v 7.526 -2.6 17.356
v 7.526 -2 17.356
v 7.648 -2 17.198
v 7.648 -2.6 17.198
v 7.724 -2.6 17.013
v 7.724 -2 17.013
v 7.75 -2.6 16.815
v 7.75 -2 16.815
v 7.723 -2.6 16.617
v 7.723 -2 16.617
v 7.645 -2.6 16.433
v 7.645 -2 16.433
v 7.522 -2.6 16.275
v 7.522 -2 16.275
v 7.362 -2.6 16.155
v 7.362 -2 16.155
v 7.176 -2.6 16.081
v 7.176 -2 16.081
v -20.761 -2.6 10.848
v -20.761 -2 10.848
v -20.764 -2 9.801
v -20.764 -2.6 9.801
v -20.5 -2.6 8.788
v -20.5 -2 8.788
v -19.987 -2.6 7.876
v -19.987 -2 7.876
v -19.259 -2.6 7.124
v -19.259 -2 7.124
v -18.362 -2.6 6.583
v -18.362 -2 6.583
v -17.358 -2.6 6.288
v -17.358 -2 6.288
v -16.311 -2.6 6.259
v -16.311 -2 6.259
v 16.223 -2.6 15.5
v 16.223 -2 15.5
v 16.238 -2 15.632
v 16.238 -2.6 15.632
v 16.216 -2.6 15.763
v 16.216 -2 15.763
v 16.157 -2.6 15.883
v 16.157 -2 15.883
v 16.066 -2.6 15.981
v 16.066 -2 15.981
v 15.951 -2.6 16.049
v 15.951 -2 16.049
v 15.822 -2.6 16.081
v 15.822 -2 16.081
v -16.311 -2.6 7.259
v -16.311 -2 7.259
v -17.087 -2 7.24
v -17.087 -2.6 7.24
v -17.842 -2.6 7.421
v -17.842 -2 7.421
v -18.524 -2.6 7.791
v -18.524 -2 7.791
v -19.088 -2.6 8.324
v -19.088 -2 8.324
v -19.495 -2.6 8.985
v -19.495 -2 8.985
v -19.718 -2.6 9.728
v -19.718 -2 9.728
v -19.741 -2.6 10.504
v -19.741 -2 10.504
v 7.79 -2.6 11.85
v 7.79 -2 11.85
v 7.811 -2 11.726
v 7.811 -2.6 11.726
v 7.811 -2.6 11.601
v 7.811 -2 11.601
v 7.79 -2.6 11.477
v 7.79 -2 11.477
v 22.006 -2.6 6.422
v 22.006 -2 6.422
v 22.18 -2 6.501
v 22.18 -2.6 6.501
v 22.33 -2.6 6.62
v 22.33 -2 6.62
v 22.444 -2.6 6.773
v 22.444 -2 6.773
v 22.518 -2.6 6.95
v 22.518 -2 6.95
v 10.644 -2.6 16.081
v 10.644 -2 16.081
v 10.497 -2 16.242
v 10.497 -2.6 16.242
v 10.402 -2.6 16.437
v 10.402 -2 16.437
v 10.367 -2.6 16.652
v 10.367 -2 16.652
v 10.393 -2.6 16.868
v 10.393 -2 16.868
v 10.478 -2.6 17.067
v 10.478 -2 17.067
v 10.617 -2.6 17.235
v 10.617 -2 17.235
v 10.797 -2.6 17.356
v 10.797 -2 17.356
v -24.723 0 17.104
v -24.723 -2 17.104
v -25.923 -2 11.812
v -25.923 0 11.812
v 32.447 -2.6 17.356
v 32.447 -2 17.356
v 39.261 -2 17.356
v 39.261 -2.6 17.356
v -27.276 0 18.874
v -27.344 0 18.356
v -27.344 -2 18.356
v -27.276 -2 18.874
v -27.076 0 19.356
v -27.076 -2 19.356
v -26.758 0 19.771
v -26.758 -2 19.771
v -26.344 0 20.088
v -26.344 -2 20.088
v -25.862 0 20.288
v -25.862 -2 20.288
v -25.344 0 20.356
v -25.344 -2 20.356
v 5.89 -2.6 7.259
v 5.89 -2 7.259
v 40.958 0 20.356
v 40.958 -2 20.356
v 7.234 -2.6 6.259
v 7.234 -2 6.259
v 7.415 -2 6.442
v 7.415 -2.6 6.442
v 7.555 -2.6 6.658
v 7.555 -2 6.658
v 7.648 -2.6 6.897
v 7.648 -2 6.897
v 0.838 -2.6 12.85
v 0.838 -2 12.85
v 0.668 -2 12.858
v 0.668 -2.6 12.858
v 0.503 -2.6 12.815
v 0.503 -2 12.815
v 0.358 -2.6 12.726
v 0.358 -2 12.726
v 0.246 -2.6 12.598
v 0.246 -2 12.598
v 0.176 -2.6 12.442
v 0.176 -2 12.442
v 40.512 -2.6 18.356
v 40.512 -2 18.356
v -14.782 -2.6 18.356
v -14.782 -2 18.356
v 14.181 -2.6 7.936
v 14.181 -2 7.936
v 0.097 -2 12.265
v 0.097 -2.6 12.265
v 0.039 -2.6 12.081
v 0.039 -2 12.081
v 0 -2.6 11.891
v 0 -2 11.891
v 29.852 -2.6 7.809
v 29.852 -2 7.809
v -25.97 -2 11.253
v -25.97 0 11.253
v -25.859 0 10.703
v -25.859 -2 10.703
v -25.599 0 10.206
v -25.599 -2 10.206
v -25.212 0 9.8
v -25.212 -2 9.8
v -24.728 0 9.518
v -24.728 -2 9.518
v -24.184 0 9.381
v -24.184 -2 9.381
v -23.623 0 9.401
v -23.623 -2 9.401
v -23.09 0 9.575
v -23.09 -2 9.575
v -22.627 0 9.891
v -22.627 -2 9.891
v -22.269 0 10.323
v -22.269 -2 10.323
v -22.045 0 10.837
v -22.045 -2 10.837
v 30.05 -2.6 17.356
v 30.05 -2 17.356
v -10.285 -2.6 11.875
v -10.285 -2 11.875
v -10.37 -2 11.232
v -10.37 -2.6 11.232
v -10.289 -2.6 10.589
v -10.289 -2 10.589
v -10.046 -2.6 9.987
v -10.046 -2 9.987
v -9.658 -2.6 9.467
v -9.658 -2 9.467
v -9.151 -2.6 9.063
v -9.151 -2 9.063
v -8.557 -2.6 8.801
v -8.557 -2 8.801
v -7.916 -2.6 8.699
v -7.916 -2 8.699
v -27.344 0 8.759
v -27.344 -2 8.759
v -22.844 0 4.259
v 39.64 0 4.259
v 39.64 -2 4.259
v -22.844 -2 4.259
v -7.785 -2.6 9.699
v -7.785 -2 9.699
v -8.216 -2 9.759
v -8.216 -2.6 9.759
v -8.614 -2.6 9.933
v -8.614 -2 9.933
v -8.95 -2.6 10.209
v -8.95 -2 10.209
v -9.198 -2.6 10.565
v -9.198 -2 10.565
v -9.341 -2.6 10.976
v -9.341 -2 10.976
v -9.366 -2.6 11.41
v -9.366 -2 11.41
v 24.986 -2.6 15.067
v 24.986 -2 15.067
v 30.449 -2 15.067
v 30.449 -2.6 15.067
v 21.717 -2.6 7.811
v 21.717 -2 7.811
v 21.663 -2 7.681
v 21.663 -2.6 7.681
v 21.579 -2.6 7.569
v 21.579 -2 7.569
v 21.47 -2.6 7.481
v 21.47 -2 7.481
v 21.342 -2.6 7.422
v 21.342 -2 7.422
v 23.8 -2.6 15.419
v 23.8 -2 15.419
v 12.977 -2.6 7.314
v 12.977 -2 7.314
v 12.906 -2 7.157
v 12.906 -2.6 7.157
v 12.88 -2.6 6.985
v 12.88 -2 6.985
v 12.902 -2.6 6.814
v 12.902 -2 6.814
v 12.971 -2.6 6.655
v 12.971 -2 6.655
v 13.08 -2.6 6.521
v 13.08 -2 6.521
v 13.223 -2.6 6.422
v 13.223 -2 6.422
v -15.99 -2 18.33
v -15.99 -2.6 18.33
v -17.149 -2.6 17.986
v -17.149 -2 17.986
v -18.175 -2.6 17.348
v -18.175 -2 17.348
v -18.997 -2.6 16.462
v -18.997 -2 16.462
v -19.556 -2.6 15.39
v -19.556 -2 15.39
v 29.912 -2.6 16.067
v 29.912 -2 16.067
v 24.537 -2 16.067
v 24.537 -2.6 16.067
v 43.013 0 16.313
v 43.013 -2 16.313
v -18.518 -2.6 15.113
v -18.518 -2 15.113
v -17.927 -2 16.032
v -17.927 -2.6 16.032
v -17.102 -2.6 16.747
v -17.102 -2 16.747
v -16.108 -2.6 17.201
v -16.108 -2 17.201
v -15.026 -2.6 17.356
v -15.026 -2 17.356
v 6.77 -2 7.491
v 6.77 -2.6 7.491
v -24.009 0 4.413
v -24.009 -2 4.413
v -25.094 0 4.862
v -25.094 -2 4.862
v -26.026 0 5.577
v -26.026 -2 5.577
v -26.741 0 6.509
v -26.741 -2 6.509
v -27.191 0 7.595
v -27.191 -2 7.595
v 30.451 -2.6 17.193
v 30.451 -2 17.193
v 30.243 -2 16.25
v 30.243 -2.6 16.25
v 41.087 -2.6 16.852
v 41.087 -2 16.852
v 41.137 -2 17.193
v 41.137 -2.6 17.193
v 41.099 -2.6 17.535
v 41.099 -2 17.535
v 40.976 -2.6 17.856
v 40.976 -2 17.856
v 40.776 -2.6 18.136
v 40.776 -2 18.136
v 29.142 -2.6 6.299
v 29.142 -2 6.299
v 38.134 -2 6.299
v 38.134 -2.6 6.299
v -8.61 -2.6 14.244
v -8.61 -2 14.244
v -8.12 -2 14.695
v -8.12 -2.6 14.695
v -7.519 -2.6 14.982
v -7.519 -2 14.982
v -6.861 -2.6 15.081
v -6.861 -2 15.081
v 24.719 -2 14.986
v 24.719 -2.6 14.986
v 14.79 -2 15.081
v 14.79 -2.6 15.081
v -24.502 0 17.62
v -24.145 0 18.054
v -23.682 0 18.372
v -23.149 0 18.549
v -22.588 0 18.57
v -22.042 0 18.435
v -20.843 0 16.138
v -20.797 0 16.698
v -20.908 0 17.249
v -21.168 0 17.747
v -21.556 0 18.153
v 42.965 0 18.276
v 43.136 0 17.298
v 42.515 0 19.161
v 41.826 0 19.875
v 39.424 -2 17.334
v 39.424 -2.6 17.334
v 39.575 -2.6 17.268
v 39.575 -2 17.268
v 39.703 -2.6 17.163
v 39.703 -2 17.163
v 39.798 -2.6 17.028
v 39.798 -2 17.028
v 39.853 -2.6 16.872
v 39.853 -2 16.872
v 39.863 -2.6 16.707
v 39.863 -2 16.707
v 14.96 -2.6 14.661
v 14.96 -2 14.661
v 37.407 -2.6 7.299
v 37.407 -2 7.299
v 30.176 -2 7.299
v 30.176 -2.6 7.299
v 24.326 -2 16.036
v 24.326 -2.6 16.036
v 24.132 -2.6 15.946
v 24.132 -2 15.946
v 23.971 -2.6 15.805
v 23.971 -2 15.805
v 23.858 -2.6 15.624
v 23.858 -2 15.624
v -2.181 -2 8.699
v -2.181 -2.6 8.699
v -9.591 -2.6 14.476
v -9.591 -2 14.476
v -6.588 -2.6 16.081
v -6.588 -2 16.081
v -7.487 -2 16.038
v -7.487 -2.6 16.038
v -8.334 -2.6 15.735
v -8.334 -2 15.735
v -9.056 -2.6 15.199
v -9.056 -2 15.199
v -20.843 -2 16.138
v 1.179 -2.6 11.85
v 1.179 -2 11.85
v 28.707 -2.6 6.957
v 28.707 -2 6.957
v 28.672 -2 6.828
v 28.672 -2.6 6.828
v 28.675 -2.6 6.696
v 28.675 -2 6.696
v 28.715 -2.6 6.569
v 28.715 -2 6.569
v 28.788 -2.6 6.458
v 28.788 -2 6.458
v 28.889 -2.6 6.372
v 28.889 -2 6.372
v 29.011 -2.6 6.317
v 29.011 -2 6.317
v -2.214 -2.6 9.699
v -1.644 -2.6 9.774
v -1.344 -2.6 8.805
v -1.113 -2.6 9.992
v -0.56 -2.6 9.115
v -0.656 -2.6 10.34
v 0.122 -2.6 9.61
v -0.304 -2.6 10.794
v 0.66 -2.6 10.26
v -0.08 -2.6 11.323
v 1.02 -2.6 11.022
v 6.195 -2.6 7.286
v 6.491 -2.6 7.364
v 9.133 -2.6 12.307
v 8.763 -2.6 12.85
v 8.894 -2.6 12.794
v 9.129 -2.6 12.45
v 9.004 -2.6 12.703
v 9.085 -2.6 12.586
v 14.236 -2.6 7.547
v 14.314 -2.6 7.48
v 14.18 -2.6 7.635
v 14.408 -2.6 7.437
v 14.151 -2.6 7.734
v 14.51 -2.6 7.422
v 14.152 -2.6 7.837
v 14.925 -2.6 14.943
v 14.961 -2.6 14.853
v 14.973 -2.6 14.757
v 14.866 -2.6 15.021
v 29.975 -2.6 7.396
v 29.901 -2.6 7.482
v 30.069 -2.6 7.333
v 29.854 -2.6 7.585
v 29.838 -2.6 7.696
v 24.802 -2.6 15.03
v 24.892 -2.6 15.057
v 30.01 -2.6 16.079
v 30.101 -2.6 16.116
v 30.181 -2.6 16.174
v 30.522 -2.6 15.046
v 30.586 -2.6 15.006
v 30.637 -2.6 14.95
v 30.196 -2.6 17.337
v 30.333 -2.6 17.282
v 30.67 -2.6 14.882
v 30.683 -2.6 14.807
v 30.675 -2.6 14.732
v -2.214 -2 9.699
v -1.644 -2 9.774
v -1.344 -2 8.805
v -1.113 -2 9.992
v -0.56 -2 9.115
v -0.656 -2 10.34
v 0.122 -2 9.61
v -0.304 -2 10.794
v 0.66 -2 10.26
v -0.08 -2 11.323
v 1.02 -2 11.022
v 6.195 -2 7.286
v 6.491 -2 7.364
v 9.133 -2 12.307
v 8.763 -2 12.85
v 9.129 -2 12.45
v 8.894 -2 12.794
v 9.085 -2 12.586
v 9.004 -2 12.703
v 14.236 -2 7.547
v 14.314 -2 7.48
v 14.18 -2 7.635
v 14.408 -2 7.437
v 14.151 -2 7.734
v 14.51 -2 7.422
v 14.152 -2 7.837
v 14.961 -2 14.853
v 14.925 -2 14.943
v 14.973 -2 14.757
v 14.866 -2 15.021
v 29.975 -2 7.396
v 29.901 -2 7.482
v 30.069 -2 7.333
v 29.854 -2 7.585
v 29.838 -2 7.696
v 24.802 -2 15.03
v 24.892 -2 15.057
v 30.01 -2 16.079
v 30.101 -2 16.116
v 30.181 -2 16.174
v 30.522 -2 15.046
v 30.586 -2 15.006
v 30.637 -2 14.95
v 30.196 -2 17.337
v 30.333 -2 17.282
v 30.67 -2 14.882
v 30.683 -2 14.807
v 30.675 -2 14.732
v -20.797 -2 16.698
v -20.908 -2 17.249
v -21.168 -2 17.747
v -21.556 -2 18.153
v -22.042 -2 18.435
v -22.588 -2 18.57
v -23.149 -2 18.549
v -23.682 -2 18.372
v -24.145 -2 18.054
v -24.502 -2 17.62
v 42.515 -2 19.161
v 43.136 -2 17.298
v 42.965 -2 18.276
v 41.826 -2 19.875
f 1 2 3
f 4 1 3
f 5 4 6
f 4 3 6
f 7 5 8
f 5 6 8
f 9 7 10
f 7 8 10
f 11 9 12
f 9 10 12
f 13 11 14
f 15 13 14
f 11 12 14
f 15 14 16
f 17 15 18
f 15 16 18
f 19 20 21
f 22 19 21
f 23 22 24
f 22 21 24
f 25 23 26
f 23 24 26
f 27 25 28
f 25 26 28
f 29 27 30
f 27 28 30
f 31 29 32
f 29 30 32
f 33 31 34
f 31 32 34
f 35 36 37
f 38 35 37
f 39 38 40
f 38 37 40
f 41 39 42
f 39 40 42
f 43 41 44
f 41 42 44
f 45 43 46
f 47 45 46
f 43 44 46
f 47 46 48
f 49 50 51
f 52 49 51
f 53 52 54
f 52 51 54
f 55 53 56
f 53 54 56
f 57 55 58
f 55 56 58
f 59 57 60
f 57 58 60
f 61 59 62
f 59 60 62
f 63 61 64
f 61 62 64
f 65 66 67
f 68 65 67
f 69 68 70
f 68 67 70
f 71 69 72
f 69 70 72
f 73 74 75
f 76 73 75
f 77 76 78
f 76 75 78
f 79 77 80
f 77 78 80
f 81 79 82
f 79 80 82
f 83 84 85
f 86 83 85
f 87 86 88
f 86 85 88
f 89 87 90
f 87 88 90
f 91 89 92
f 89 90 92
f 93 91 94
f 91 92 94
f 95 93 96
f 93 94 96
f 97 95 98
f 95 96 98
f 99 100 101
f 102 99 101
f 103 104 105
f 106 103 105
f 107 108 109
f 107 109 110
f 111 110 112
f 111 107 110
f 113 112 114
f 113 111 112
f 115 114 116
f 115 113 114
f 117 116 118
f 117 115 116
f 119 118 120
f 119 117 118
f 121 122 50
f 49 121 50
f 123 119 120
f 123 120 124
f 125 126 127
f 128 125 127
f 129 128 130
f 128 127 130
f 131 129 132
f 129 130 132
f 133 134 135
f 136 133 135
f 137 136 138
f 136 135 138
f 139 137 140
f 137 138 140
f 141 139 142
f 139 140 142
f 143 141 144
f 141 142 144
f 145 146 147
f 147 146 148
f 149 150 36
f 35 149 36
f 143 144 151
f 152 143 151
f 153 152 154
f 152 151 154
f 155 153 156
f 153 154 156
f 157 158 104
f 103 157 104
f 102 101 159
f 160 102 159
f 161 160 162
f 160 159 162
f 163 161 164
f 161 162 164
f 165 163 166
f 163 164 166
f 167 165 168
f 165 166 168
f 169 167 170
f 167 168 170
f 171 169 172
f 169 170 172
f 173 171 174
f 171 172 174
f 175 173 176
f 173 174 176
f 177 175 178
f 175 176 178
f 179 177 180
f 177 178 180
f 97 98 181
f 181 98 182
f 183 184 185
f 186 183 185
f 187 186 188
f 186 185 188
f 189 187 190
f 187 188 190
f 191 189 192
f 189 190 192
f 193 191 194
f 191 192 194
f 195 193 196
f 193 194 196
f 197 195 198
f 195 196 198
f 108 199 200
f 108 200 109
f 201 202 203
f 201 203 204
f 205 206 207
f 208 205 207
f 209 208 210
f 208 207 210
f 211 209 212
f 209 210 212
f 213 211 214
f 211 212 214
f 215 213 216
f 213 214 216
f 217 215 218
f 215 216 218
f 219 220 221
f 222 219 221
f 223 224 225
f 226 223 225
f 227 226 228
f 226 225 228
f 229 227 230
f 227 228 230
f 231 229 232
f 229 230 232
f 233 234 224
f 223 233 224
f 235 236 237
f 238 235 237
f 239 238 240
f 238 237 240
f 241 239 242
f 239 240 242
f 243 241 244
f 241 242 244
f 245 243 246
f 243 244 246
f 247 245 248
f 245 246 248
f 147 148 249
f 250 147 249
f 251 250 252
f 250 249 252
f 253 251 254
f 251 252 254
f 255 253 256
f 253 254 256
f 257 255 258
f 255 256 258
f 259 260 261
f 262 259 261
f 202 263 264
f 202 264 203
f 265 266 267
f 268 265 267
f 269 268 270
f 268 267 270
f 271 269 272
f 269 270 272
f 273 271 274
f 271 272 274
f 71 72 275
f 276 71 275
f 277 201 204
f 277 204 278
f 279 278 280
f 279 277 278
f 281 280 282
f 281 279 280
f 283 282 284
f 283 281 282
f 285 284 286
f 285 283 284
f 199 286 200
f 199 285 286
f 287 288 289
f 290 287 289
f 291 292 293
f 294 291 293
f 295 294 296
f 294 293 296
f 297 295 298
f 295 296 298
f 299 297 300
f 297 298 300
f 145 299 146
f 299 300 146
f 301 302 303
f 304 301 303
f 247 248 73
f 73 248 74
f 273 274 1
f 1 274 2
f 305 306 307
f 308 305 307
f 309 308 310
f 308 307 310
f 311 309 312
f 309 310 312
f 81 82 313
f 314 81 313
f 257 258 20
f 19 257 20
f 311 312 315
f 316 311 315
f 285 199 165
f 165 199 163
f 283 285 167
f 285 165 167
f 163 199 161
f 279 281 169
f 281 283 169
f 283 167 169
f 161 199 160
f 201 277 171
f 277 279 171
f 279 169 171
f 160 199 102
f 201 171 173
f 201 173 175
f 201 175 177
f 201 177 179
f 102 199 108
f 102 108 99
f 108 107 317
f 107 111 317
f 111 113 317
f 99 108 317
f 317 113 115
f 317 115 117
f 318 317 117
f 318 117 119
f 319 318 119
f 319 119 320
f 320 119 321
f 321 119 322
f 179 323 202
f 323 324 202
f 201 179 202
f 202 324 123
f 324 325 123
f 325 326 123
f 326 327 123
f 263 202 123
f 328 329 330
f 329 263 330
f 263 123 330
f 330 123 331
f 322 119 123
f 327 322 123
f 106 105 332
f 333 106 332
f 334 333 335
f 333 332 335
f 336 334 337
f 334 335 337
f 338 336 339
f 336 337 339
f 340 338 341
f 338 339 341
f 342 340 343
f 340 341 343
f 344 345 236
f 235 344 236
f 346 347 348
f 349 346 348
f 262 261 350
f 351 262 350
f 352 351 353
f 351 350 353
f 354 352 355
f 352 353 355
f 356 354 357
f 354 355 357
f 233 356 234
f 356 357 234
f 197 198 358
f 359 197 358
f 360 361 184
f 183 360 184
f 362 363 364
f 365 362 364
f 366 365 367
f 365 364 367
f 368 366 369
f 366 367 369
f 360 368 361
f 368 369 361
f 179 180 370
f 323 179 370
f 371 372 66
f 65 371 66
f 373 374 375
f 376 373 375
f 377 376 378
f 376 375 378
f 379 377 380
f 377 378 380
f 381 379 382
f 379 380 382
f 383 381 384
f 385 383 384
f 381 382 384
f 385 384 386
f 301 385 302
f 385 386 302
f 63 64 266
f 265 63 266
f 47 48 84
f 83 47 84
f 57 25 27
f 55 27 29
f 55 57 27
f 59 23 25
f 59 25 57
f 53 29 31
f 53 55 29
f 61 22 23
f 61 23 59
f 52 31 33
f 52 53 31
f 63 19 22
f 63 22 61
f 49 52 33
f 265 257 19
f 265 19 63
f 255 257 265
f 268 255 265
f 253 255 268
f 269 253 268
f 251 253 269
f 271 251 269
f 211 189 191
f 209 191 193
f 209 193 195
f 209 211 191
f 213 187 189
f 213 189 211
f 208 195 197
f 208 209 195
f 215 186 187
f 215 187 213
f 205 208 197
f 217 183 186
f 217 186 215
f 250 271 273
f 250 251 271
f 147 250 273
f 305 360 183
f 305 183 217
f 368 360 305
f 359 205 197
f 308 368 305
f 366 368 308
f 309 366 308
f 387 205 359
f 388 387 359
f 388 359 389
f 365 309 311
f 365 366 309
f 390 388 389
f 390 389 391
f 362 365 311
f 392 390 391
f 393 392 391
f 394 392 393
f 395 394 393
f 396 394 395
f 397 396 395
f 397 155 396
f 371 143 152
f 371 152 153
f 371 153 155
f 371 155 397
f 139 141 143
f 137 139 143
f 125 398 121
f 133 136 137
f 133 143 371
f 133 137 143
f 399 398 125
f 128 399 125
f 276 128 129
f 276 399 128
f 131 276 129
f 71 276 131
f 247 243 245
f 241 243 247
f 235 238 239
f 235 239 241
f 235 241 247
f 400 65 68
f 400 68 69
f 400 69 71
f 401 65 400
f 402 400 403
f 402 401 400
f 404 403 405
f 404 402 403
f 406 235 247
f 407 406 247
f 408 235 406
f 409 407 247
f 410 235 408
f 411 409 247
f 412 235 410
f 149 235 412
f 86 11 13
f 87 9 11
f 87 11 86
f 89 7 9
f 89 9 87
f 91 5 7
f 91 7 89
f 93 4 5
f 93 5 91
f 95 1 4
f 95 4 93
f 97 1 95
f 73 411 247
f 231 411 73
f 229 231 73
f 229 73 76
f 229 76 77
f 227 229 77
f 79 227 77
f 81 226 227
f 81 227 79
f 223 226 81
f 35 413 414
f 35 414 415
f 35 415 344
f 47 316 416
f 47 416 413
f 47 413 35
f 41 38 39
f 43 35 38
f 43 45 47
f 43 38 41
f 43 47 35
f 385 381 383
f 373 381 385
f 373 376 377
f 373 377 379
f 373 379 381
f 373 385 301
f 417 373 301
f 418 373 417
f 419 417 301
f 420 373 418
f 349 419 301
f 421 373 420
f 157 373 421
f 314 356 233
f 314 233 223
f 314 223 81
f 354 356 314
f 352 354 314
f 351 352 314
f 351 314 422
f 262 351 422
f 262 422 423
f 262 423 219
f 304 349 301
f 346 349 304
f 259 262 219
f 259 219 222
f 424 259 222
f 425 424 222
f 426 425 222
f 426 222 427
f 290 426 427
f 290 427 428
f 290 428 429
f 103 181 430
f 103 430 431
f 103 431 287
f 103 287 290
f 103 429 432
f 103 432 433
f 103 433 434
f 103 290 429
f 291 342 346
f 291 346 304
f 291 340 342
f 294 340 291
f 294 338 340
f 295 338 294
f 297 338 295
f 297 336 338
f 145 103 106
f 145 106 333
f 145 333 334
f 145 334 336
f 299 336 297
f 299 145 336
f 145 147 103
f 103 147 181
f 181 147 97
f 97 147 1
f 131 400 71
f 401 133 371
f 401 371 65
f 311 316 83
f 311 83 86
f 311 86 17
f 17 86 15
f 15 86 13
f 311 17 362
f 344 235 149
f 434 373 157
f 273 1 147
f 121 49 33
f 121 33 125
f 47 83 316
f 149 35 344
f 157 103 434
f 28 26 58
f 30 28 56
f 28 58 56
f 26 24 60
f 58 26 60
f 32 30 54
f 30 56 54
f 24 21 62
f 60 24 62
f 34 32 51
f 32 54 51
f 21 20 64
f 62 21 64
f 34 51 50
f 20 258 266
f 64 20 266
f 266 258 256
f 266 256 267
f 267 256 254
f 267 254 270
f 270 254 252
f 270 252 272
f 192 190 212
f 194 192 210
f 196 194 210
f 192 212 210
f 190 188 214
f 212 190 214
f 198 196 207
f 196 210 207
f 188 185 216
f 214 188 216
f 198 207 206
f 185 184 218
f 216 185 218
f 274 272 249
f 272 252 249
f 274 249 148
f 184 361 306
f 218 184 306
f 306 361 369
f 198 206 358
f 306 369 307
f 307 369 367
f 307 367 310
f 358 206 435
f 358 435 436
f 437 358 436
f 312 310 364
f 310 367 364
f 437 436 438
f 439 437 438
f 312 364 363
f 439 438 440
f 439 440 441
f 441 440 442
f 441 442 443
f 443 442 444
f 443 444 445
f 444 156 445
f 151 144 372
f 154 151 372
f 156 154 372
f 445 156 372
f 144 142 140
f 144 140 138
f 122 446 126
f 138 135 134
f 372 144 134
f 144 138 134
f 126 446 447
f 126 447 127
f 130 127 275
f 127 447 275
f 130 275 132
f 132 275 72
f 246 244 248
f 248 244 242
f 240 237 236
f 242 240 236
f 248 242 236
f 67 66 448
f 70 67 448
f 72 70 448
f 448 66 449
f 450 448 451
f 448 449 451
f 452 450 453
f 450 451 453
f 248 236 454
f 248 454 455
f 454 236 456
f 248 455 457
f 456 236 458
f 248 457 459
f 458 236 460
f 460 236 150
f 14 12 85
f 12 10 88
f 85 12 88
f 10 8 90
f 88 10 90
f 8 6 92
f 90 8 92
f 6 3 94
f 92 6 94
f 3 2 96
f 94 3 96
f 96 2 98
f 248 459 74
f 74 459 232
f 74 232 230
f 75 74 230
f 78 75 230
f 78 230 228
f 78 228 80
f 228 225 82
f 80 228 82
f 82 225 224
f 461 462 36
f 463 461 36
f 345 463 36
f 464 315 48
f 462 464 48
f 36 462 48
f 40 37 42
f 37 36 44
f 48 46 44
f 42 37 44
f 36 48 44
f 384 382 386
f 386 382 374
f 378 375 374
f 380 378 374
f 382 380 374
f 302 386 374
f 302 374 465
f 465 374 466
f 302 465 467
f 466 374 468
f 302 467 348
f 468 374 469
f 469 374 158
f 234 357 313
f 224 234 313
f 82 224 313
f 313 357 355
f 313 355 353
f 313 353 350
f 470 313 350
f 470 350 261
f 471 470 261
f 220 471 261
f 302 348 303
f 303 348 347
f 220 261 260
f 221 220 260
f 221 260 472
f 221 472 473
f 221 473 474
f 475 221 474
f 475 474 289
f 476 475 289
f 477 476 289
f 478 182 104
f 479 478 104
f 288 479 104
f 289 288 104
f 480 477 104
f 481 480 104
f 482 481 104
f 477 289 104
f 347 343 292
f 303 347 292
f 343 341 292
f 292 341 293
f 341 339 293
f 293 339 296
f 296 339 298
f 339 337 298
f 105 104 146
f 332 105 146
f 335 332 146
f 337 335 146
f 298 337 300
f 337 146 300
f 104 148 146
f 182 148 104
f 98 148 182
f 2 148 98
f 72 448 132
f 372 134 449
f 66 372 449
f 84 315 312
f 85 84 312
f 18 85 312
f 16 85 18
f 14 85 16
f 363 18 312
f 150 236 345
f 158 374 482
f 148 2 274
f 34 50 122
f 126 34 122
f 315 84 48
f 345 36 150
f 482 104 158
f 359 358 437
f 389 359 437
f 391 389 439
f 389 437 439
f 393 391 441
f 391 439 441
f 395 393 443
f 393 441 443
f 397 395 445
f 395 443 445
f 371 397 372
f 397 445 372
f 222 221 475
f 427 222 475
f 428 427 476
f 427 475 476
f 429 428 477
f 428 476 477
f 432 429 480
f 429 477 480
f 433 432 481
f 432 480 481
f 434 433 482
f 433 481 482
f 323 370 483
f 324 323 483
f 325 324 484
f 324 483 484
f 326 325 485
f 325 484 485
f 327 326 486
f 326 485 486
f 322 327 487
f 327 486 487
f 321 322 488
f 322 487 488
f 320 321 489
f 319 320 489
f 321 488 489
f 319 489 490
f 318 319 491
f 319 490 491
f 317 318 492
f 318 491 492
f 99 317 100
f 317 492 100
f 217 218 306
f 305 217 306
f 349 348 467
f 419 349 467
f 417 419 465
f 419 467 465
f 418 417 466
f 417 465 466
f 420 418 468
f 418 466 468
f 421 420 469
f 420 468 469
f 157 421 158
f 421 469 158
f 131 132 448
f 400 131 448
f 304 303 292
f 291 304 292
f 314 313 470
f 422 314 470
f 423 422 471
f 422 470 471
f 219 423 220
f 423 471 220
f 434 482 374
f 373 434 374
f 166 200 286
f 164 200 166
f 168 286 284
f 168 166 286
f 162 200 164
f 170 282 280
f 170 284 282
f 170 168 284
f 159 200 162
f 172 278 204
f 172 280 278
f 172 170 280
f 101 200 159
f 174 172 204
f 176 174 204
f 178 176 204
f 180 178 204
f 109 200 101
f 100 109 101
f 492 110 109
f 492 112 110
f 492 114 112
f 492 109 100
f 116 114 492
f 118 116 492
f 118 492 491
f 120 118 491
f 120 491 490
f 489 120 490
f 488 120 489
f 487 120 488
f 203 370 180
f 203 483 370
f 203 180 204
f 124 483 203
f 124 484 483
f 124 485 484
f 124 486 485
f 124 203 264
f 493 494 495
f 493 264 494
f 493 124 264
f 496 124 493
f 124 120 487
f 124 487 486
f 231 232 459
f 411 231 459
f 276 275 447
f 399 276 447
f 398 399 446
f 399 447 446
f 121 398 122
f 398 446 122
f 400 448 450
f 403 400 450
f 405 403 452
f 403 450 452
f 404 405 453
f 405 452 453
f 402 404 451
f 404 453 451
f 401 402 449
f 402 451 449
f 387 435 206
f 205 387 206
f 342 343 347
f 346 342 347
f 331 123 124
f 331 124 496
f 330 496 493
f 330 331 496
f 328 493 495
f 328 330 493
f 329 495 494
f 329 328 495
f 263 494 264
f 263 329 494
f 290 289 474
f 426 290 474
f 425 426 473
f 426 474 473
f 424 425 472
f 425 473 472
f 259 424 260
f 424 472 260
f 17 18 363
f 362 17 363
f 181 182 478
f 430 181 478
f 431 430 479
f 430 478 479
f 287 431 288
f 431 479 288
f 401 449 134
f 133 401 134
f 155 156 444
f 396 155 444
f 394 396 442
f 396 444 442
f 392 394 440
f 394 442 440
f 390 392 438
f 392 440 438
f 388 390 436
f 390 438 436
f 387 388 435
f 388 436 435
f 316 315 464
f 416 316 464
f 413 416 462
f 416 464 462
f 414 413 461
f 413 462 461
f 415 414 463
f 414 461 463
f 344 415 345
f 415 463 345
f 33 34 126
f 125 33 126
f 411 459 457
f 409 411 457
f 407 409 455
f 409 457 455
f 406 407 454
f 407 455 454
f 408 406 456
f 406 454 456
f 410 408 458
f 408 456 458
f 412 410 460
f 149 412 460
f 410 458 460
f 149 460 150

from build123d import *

# Parameters (mm, degrees)
F0_W     = 90
F0_H     = 20
F1_DEPTH = 2
F3_DEPTH = 0.6
F4_W     = 90
F4_H     = 20
F5_DEPTH = 12.5


with BuildPart() as f1:
    # F0 (on Front) → F1 (new body)
    with BuildSketch(Plane.XZ):
        with Locations((-1.023429, 14.202245)):
            Rectangle(F0_W, F0_H)
    extrude(amount=F1_DEPTH)

    # F4 (on face) → F5 (cut, symmetric)
    with BuildSketch(Plane.XZ.offset(2)):
        with Locations((-1.023429, 14.202245)):
            Rectangle(F4_W, F4_H)
        with BuildLine():
            ThreePointArc((40.958338, 20.356357), (42.773223, 18.735113), (43.012962, 16.313385))
            Line((43.012962, 16.313385), (39.640076, 4.259368))
            Line((39.640076, 4.259368), (-22.844137, 4.259368))
            ThreePointArc((-22.844137, 4.259368), (-26.026117, 5.577388), (-27.344137, 8.759368))
            Line((-27.344137, 8.759368), (-27.344137, 18.356357))
            ThreePointArc((-27.344137, 18.356357), (-26.75835, 19.770571), (-25.344137, 20.356357))
            Line((-25.344137, 20.356357), (40.958338, 20.356357))
        make_face(mode=Mode.SUBTRACT)
        with BuildLine():
            Line((-22.045259, 10.836985), (-20.84269, 16.138336))
            ThreePointArc((-20.84269, 16.138336), (-22.31015, 18.521584), (-24.723457, 17.104099))
            Line((-24.723457, 17.104099), (-25.923461, 11.812092))
            ThreePointArc((-25.923461, 11.812092), (-24.460665, 9.430176), (-22.045259, 10.836985))
        make_face()
    extrude(amount=F5_DEPTH, both=True, mode=Mode.SUBTRACT)


with BuildPart() as f3:
    # F2 (on face) → F3 (new body)
    with BuildSketch(Plane.XZ.offset(2)):
        with BuildLine():
            Line((40.511969, 18.356357), (-14.781927, 18.356357))
            ThreePointArc((-14.781927, 18.356357), (-17.683208, 17.700946), (-19.555835, 15.390045))
            Line((-19.555835, 15.390045), (-20.760898, 10.847882))
            ThreePointArc((-20.760898, 10.847882), (-19.647113, 7.476341), (-16.311429, 6.259369))
            Line((-16.311429, 6.259369), (7.233665, 6.259369))
            ThreePointArc((7.233665, 6.259369), (7.490289, 6.546283), (7.647897, 6.897475))
            Line((7.647897, 6.897475), (9.132858, 12.307275))
            ThreePointArc((9.132858, 12.307275), (9.048651, 12.647304), (8.76317, 12.85031))
            Line((8.76317, 12.85031), (0.837556, 12.85031))
            ThreePointArc((0.837556, 12.85031), (0.427002, 12.775594), (0.17565, 12.442487))
            ThreePointArc((0.17565, 12.442487), (0.065456, 12.173992), (0, 11.891241))
            ThreePointArc((0, 11.891241), (-0.656036, 10.339959), (-2.213708, 9.699241))
            Line((-2.213708, 9.699241), (-7.785189, 9.699241))
            ThreePointArc((-7.785189, 9.699241), (-8.949809, 10.208759), (-9.366026, 11.409888))
            Line((-9.366026, 11.409888), (-8.610257, 14.244024))
            ThreePointArc((-8.610257, 14.244024), (-7.830442, 14.860793), (-6.860833, 15.080733))
            Line((-6.860833, 15.080733), (14.789964, 15.080733))
            ThreePointArc((14.789964, 15.080733), (14.945787, 14.899525), (14.960353, 14.660978))
            Line((14.960353, 14.660978), (12.977388, 7.314254))
            ThreePointArc((12.977388, 7.314254), (12.902171, 6.813726), (13.222572, 6.421899))
            Line((13.222572, 6.421899), (22.005849, 6.421899))
            ThreePointArc((22.005849, 6.421899), (22.329555, 6.620061), (22.517713, 6.949682))
            Line((22.517713, 6.949682), (24.718596, 14.986239))
            ThreePointArc((24.718596, 14.986239), (24.846393, 15.046083), (24.986006, 15.066611))
            Line((24.986006, 15.066611), (30.173999, 15.066611))
            Line((30.173999, 15.066611), (30.448972, 15.066611))
            ThreePointArc((30.448972, 15.066611), (30.637031, 14.950078), (30.675194, 14.732156))
            Line((30.675194, 14.732156), (28.706573, 6.956836))
            ThreePointArc((28.706573, 6.956836), (28.747623, 6.510733), (29.142261, 6.298708))
            Line((29.142261, 6.298708), (38.133892, 6.298708))
            Line((38.133892, 6.298708), (41.08694, 16.852313))
            ThreePointArc((41.08694, 16.852313), (41.047823, 17.699282), (40.511969, 18.356357))
        make_face()
        with BuildLine():
            Line((-19.741228, 10.503771), (-18.518419, 15.112824))
            ThreePointArc((-18.518419, 15.112824), (-17.101634, 16.747143), (-15.026269, 17.356357))
            Line((-15.026269, 17.356357), (7.525786, 17.356357))
            ThreePointArc((7.525786, 17.356357), (7.722787, 16.61678), (7.176492, 16.080733))
            Line((7.176492, 16.080733), (-6.588344, 16.080733))
            ThreePointArc((-6.588344, 16.080733), (-8.333991, 15.735058), (-9.591171, 14.475586))
            Line((-9.591171, 14.475586), (-10.284564, 11.875363))
            ThreePointArc((-10.284564, 11.875363), (-9.868832, 9.714337), (-7.916283, 8.699241))
            Line((-7.916283, 8.699241), (-2.180934, 8.699241))
            ThreePointArc((-2.180934, 8.699241), (0.122362, 9.610244), (1.179344, 11.85031))
            Line((1.179344, 11.85031), (7.789848, 11.85031))
            ThreePointArc((7.789848, 11.85031), (7.813339, 11.663701), (7.789848, 11.477092))
            Line((7.789848, 11.477092), (6.770179, 7.491111))
            ThreePointArc((6.770179, 7.491111), (6.344858, 7.318274), (5.889555, 7.259369))
            Line((5.889555, 7.259369), (-16.311429, 7.259369))
            ThreePointArc((-16.311429, 7.259369), (-18.82347, 8.038877), (-19.741228, 10.503771))
        make_face(mode=Mode.SUBTRACT)
        with BuildLine():
            ThreePointArc((10.643511, 16.080733), (10.371893, 16.760575), (10.797339, 17.356357))
            Line((10.797339, 17.356357), (30.049997, 17.356357))
            ThreePointArc((30.049997, 17.356357), (30.266527, 17.313885), (30.450967, 17.192762))
            Line((30.450967, 17.192762), (30.243494, 16.25029))
            ThreePointArc((30.243494, 16.25029), (30.101385, 16.115597), (29.911813, 16.066611))
            Line((29.911813, 16.066611), (24.536972, 16.066611))
            ThreePointArc((24.536972, 16.066611), (24.046371, 15.881564), (23.800184, 15.418614))
            Line((23.800184, 15.418614), (21.716854, 7.8113))
            ThreePointArc((21.716854, 7.8113), (21.579109, 7.568882), (21.342178, 7.421899))
            Line((21.342178, 7.421899), (14.51023, 7.421899))
            ThreePointArc((14.51023, 7.421899), (14.204866, 7.58904), (14.181082, 7.93634))
            Line((14.181082, 7.93634), (16.222509, 15.49966))
            ThreePointArc((16.222509, 15.49966), (16.156668, 15.883008), (15.821711, 16.080733))
            Line((15.821711, 16.080733), (10.643511, 16.080733))
        make_face(mode=Mode.SUBTRACT)
        with BuildLine():
            Line((29.851789, 7.808543), (32.447312, 17.356357))
            Line((32.447312, 17.356357), (39.260555, 17.356357))
            ThreePointArc((39.260555, 17.356357), (39.703301, 17.16329), (39.863091, 16.707477))
            Line((39.863091, 16.707477), (37.406612, 7.298708))
            Line((37.406612, 7.298708), (30.17623, 7.298708))
            ThreePointArc((30.17623, 7.298708), (29.901366, 7.481944), (29.851789, 7.808543))
        make_face(mode=Mode.SUBTRACT)
    extrude(amount=F3_DEPTH)


solid = Compound([f1.part, f3.part])
